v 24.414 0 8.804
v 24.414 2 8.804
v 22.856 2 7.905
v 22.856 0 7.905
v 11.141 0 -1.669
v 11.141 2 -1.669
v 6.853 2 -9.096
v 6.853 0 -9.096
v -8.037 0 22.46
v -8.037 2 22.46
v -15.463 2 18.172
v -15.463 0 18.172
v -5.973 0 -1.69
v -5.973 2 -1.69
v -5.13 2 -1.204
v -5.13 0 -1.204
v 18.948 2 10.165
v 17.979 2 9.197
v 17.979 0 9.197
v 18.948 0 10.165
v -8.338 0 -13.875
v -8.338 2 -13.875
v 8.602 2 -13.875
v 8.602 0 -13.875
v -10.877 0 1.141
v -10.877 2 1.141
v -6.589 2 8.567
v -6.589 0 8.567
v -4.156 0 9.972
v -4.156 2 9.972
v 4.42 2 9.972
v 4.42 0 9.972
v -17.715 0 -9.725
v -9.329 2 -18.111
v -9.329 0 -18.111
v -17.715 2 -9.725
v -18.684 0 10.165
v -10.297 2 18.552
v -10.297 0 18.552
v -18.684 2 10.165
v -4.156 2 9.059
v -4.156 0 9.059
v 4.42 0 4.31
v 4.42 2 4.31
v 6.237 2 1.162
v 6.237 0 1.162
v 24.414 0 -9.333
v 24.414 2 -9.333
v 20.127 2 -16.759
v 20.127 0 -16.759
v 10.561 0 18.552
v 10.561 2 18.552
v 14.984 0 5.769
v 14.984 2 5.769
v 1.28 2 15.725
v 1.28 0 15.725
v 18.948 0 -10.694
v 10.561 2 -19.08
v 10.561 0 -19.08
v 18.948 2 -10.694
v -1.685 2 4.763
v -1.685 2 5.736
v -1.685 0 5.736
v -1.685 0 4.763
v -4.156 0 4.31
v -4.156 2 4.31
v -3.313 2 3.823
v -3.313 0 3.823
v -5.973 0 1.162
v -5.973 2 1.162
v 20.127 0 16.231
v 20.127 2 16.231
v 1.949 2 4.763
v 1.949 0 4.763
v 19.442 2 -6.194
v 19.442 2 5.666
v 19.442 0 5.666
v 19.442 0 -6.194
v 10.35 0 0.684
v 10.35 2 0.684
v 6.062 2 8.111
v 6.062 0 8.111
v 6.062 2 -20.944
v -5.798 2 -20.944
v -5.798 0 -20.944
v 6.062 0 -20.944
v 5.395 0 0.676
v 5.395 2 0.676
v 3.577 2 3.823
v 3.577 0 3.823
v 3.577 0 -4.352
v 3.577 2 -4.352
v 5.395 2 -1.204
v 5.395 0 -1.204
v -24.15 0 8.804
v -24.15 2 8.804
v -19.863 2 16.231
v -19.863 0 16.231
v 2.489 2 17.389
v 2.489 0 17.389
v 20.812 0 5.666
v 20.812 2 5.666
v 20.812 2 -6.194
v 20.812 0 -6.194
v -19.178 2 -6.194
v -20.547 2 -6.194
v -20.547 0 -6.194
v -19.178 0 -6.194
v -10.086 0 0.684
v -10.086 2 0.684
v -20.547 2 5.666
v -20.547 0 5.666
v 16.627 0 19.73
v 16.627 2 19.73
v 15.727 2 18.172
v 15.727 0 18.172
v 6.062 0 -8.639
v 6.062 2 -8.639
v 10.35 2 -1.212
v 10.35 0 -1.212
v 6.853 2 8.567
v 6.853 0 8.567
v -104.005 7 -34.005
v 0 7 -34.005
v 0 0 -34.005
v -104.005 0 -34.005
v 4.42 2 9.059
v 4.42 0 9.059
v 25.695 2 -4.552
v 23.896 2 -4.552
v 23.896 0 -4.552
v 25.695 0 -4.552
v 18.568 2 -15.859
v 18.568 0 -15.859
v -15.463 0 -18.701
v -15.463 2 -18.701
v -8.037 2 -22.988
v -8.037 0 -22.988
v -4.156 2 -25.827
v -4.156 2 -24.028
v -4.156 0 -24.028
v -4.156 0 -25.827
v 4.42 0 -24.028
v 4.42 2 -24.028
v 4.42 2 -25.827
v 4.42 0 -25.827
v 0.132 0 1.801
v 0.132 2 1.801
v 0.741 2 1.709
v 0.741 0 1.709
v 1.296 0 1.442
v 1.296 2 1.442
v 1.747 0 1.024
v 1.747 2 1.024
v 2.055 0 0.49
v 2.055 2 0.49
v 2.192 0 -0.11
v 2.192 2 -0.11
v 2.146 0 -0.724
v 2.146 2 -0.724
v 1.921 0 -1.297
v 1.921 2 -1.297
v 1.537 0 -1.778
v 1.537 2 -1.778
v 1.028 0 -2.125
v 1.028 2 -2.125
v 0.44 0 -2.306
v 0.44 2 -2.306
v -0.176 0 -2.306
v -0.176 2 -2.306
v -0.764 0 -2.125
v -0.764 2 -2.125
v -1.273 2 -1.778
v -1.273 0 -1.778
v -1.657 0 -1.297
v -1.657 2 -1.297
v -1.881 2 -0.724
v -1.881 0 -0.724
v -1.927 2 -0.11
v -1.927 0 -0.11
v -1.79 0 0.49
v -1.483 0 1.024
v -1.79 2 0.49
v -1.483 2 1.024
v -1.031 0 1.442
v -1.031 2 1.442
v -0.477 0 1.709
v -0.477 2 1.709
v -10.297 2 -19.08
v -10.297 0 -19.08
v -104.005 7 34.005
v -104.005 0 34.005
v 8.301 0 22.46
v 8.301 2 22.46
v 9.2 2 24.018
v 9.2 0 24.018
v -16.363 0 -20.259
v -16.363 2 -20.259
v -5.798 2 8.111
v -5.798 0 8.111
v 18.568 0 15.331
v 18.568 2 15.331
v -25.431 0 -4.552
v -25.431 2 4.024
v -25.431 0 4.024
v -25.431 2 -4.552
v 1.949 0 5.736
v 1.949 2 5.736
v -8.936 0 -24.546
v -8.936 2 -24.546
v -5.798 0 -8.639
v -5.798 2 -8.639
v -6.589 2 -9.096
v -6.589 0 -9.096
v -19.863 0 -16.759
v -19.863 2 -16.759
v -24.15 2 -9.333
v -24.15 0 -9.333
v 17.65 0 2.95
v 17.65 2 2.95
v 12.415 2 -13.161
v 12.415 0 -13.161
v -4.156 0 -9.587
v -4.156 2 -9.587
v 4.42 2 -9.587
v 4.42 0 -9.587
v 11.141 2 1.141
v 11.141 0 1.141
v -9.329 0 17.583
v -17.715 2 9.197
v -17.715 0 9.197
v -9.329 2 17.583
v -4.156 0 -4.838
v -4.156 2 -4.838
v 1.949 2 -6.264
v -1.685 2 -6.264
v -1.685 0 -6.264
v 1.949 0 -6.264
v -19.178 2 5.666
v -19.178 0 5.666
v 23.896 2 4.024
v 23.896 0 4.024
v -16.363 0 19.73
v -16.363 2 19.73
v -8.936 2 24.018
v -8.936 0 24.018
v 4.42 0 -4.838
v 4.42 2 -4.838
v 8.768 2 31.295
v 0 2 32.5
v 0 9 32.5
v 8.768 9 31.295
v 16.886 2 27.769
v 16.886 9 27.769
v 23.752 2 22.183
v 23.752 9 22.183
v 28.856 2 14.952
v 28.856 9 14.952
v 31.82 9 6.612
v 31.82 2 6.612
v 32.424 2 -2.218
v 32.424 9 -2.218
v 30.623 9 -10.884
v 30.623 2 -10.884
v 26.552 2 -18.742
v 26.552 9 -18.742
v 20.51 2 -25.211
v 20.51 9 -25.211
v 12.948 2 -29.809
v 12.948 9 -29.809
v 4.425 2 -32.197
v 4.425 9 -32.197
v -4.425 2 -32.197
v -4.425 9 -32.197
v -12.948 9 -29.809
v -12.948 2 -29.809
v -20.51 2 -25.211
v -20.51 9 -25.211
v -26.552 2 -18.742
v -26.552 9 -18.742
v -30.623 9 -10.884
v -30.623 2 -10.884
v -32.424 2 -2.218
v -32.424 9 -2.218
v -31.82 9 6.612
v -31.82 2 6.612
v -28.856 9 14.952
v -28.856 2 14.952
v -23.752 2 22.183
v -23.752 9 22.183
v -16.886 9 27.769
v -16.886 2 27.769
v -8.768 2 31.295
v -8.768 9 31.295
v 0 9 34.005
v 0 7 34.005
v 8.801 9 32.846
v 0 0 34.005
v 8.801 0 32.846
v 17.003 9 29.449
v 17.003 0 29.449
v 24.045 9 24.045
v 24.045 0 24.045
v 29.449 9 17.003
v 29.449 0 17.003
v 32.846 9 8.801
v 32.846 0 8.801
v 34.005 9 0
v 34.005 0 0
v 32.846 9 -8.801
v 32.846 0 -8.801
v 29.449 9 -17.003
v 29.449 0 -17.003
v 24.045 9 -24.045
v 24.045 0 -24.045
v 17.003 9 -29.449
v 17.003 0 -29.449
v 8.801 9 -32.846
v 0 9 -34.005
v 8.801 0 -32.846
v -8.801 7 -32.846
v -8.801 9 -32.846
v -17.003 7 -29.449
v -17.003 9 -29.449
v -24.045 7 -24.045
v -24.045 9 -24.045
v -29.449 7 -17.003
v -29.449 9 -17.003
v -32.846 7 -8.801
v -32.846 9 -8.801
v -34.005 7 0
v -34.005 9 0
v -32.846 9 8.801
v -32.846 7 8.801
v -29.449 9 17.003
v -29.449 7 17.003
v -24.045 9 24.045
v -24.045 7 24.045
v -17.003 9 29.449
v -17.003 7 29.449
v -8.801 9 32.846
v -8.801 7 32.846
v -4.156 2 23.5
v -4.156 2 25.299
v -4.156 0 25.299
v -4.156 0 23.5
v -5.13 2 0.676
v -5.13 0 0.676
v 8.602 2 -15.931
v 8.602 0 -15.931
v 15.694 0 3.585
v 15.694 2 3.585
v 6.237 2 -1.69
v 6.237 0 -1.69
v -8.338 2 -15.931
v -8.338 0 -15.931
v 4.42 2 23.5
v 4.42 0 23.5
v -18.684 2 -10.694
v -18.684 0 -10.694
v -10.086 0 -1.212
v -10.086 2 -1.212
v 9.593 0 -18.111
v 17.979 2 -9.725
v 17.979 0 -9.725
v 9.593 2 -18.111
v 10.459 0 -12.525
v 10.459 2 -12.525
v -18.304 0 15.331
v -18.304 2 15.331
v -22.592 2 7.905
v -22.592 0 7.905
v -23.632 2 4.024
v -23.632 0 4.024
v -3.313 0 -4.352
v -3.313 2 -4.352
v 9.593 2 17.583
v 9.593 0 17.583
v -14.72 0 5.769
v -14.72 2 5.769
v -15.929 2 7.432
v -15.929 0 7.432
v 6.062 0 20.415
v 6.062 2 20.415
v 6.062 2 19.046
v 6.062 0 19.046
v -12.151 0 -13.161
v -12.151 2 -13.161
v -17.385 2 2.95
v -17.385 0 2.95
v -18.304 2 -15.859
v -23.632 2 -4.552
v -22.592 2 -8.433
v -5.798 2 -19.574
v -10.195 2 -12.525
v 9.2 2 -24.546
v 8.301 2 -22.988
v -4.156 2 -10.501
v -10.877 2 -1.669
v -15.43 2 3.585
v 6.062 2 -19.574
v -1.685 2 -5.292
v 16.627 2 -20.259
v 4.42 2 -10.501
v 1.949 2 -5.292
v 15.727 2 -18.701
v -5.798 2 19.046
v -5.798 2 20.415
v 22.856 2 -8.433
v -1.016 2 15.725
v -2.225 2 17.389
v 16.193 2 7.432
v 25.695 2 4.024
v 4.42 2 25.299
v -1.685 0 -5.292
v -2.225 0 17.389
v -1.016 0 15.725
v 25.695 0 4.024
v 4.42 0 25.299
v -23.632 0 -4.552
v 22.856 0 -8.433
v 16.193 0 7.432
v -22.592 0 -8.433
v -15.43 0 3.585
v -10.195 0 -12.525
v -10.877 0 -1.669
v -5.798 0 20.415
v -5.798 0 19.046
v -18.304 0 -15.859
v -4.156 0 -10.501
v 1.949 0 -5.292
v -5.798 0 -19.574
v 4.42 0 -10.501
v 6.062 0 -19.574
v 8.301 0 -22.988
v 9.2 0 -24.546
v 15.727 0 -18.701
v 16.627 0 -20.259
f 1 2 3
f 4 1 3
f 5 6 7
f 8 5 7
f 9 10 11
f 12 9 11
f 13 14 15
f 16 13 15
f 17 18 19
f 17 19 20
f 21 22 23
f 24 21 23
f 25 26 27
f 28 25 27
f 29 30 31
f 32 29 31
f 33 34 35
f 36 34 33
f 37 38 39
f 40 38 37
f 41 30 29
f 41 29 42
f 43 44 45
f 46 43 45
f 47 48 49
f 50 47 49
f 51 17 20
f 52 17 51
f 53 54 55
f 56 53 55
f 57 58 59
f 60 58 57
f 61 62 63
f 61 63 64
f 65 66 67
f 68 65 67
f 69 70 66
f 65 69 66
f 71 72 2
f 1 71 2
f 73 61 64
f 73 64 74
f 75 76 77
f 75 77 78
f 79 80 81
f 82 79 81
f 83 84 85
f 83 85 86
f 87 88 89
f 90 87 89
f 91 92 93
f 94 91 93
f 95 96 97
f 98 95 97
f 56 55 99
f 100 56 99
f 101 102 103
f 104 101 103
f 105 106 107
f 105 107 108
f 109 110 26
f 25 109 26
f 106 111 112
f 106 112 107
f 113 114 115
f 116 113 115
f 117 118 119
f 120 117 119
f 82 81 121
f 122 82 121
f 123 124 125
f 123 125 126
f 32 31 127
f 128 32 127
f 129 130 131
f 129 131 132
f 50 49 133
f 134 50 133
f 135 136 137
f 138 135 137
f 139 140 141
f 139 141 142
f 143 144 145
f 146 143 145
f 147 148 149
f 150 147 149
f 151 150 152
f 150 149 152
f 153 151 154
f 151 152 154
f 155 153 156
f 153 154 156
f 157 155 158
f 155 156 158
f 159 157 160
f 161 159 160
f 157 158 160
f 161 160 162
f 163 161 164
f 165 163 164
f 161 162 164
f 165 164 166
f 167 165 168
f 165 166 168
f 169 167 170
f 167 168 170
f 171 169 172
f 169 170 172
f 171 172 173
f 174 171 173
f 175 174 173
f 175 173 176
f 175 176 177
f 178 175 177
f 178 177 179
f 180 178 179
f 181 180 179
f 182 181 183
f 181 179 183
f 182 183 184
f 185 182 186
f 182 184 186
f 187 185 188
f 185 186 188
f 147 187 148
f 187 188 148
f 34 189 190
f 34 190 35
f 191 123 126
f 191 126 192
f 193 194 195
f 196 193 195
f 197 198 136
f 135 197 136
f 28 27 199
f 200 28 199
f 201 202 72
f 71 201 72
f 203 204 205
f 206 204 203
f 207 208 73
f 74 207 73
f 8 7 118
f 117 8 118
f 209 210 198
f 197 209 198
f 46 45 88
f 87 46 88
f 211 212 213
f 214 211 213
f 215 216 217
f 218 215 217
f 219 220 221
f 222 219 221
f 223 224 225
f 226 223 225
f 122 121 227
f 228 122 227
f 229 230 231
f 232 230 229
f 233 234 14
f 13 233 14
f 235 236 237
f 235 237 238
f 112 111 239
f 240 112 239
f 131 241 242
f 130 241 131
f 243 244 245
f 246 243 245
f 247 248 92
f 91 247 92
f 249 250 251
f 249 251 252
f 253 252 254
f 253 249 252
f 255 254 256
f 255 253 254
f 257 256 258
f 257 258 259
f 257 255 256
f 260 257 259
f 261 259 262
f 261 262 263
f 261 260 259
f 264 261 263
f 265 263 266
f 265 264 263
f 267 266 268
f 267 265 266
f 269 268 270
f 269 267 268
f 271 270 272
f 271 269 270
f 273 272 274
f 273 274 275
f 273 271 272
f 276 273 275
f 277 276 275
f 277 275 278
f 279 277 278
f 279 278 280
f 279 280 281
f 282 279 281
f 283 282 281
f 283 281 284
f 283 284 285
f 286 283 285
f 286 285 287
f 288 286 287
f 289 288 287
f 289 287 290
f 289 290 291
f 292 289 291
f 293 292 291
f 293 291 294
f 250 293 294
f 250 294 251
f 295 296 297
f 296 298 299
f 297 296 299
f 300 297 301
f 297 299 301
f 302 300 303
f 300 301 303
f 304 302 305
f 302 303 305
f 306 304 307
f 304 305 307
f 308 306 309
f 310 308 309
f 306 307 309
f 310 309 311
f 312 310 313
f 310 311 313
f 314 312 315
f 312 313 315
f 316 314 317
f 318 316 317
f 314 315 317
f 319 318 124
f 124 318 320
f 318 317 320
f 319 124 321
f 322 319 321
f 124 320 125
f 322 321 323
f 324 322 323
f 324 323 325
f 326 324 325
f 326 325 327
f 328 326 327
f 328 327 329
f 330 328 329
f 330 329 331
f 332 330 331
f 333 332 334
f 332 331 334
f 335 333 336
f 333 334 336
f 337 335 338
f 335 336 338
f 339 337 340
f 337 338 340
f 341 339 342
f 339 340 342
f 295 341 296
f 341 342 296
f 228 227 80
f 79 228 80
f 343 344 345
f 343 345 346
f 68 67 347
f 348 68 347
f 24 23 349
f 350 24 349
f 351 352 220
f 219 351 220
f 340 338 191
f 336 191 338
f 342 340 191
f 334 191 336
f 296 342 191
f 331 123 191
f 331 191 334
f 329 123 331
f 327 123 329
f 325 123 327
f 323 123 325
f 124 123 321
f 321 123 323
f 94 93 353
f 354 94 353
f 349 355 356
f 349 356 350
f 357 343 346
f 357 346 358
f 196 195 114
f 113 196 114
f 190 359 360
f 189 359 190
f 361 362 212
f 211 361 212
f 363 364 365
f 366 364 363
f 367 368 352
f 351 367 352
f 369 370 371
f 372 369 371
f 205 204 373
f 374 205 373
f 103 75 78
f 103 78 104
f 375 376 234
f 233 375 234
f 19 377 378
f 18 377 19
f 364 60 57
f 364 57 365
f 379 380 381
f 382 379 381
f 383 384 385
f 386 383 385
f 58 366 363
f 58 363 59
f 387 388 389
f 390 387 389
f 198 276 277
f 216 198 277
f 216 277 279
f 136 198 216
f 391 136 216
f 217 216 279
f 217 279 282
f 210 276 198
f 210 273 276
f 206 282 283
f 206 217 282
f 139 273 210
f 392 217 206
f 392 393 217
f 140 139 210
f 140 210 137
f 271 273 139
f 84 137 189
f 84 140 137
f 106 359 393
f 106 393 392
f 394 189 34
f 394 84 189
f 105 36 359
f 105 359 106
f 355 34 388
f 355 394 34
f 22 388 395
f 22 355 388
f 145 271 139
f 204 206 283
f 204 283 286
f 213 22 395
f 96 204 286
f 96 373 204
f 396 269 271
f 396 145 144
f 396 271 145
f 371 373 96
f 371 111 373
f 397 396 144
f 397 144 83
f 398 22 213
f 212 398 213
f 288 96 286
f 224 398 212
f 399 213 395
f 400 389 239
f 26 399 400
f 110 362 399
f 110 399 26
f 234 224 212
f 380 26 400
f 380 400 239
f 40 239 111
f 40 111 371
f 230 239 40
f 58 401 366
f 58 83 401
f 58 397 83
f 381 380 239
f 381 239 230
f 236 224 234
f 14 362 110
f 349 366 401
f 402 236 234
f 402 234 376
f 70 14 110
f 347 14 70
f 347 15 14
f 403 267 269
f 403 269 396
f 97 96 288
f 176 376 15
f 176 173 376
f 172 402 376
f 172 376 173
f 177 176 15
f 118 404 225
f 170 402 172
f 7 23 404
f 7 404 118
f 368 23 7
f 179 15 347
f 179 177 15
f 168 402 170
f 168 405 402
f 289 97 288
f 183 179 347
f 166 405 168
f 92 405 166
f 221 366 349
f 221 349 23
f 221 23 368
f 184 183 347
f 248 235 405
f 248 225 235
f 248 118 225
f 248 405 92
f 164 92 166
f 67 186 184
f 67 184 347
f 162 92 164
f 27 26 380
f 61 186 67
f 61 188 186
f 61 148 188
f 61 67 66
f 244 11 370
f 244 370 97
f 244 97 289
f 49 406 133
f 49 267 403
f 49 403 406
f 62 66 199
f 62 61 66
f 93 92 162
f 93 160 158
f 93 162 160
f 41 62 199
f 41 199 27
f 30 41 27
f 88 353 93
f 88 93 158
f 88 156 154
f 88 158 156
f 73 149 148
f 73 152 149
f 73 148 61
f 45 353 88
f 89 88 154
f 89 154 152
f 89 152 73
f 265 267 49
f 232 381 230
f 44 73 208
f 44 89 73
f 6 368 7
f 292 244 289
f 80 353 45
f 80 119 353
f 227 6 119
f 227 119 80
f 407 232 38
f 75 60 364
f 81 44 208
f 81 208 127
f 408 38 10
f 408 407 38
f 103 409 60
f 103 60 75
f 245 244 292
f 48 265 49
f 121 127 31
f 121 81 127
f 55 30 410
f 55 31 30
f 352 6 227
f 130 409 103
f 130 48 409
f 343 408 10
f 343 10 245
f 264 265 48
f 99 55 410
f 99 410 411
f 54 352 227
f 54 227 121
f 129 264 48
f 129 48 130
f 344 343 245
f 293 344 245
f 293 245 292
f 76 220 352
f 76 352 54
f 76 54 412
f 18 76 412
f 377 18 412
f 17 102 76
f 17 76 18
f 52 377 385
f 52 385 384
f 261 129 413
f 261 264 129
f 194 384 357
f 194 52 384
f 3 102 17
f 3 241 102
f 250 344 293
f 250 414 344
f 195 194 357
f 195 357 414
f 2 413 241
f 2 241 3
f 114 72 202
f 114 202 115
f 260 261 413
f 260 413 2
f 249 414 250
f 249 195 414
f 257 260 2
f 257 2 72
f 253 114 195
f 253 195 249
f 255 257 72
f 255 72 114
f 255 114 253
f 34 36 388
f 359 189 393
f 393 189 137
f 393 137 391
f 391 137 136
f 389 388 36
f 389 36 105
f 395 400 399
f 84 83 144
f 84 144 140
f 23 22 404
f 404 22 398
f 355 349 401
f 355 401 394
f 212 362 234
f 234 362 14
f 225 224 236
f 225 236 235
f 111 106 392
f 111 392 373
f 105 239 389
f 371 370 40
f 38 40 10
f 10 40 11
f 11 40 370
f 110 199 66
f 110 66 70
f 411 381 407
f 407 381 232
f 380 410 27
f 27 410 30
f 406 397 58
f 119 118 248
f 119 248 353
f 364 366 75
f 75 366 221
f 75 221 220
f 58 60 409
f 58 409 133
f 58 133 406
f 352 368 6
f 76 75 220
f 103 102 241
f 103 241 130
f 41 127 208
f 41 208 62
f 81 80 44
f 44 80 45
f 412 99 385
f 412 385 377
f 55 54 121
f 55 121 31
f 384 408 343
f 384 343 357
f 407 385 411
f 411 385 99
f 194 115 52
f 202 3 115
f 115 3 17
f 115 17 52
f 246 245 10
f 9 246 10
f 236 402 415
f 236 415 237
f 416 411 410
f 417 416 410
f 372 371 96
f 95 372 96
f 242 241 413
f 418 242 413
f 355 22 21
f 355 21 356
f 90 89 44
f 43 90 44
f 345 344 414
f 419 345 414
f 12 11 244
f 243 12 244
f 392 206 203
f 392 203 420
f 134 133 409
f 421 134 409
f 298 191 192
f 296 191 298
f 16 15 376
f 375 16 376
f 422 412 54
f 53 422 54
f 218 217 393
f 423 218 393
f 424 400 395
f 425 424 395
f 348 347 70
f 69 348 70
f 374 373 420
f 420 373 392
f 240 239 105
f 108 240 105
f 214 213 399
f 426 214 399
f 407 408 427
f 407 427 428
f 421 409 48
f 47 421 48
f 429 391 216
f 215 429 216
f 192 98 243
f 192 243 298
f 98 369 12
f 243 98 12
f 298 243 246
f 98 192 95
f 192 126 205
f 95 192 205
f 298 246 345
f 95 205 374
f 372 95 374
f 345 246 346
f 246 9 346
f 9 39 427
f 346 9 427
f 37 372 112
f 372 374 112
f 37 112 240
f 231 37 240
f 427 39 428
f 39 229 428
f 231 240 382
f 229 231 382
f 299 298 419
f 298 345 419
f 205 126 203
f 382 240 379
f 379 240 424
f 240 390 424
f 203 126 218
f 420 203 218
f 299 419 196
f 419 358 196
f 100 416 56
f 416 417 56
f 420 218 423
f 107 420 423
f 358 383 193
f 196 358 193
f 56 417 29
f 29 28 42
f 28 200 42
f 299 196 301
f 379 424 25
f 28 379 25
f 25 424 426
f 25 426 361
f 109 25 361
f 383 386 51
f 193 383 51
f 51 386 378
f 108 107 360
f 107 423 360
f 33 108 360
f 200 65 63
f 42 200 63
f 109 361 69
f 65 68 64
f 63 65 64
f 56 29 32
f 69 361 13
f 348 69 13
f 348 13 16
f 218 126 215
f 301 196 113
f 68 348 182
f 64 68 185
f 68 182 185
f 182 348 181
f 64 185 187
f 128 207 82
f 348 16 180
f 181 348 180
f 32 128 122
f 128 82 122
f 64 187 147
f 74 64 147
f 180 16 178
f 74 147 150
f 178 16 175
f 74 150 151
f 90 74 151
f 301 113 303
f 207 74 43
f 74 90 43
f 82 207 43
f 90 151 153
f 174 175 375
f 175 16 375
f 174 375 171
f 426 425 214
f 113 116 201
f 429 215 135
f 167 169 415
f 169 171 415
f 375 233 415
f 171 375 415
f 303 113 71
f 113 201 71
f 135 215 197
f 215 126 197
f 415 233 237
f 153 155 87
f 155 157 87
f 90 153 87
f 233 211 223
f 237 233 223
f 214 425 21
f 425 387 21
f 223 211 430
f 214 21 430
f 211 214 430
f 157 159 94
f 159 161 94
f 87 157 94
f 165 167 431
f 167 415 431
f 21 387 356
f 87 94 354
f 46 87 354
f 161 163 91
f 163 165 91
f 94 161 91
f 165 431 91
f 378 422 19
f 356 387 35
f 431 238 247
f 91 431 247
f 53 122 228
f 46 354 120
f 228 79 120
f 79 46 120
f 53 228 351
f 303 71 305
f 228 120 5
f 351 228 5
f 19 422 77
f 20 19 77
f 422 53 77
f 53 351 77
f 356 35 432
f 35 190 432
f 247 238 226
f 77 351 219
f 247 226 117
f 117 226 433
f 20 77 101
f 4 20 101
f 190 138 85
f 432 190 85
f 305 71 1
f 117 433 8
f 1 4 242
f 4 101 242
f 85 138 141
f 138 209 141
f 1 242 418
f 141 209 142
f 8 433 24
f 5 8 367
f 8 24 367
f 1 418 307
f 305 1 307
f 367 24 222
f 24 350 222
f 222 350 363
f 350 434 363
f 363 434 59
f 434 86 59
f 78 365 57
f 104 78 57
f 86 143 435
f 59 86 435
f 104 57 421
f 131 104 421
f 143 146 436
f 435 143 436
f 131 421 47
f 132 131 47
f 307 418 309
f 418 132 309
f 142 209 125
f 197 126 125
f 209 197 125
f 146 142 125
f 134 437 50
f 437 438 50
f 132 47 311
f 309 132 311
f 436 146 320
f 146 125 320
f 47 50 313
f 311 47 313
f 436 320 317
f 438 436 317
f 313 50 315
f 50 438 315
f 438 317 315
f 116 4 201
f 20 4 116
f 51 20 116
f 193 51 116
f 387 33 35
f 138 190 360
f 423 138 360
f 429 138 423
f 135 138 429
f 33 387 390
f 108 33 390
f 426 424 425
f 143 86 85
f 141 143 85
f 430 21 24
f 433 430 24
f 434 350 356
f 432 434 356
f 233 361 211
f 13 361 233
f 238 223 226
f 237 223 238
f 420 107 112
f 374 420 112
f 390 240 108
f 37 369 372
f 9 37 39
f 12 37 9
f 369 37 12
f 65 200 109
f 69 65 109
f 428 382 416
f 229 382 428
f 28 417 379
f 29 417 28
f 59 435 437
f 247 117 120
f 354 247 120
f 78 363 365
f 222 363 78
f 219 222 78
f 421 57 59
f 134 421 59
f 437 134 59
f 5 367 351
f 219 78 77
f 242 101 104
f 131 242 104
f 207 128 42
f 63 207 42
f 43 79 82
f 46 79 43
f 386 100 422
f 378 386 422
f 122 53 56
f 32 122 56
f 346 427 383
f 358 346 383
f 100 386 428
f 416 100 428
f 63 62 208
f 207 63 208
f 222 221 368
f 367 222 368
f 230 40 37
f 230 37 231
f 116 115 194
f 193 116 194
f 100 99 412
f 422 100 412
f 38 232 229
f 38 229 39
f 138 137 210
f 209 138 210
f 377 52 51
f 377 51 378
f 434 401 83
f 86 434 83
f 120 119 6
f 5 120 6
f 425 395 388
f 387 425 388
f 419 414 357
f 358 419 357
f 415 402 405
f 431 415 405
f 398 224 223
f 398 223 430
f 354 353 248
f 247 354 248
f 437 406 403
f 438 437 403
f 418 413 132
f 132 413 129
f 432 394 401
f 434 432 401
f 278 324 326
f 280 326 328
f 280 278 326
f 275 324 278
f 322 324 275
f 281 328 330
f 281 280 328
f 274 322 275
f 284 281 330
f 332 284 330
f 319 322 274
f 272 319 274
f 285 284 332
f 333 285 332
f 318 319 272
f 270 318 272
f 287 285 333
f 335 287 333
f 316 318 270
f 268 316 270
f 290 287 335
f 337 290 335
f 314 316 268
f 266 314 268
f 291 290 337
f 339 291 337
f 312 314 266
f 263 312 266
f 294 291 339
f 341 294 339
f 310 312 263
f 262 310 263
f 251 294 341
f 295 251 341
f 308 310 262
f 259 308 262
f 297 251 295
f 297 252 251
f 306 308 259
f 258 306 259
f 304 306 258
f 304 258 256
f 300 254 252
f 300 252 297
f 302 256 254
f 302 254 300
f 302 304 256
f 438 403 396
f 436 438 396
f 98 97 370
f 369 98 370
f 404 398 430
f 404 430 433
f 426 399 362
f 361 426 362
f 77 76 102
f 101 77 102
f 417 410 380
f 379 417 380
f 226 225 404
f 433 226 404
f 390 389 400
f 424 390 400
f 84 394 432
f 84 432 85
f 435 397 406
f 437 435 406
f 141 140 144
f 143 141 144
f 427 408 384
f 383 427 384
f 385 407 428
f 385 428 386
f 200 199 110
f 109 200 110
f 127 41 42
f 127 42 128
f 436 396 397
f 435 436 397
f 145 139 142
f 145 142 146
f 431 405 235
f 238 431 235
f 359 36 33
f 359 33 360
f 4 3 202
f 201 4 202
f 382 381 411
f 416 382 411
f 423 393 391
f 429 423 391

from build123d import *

# Parameters (mm, degrees)
SKETCH_2_R           = 32.5
EXTRUDE_2_DEPTH      = 2
SKETCH_3_R           = 2.065299263
SKETCH_3_W           = 3.634517066
SKETCH_3_H           = 0.972738316
SKETCH_3_H_2         = 0.972738315
SKETCH_3_W_2         = 8.575403128
SKETCH_3_H_3         = 0.913568408
SKETCH_3_H_4         = 0.913568407
SKETCH_3_W_3         = 16.93922902
SKETCH_3_H_5         = 2.056372223
SKETCH_3_H_6         = 1.799325695
SKETCH_3_W_4         = 1.799325695
SKETCH_3_H_7         = 8.575403129
SKETCH_3_W_5         = 11.860354008
SKETCH_3_H_8         = 1.369825
SKETCH_3_W_6         = 1.369825
SKETCH_3_H_9         = 11.860354008
CUT_EXTRUDE_1_DEPTH  = 2
EXTRUDE_3_DEPTH      = 7
EXTRUDE_3_DEPTH_BACK = 2
SKETCH_4_R           = 34.00500901
SKETCH_4_R_2         = 32.5
EXTRUDE_START        = 7
EXTRUDE_4_DEPTH      = 7


with BuildPart() as part:
    # 草图2 → 凸台-拉伸2 (new body)
    with BuildSketch(Plane(origin=(0, 0, 0), x_dir=(1, 0, 0), z_dir=(0, 1, 0))):
        with Locations(Location((0, 0, 0), (0, 0, 270))):
            Circle(SKETCH_2_R)
    extrude(amount=EXTRUDE_2_DEPTH)

    # 草图3 → 切除-拉伸1 (cut)
    with BuildSketch(Plane(origin=(0, 2, 0), x_dir=(1, 0, 0), z_dir=(0, 1, 0))):
        with Locations(Location((0.132079869, 0.264159738, 0), (0, 0, 270))):
            Circle(SKETCH_3_R)
        Polygon((4.419781433, 4.838054797), (3.577365341, 4.351685639), (5.394623874, 1.20410153), (6.237039966, 1.690470687), align=None)
        with Locations((0.132079869, 5.777996588)):
            Rectangle(SKETCH_3_W, SKETCH_3_H)
        Polygon((6.237039966, -1.162151211), (5.394623874, -0.675782054), (3.577365341, -3.823366163), (4.419781433, -4.309735321), align=None)
        with Locations((0.132079869, -5.249677113)):
            Rectangle(SKETCH_3_W, SKETCH_3_H_2)
        Polygon((-4.155621695, -4.309735321), (-3.313205603, -3.823366163), (-5.130464136, -0.675782054), (-5.972880228, -1.162151211), align=None)
        Polygon((-5.972880228, 1.690470687), (-5.130464136, 1.20410153), (-3.313205603, 4.351685639), (-4.155621695, 4.838054797), align=None)
        with Locations((0.132079869, 10.044028173)):
            Rectangle(SKETCH_3_W_2, SKETCH_3_H_3)
        Polygon((6.853430322, 9.095744536), (6.062256873, 8.638960332), (10.349958437, 1.212443375), (11.141131886, 1.669227579), align=None)
        Polygon((11.141131886, -1.140908103), (10.349958437, -0.684123899), (6.062256873, -8.110640856), (6.853430322, -8.56742506), align=None)
        with Locations((0.132079869, -9.515708698)):
            Rectangle(SKETCH_3_W_2, SKETCH_3_H_4)
        Polygon((-6.589270584, -8.56742506), (-5.798097135, -8.110640856), (-10.085798699, -0.684123899), (-10.876972148, -1.140908103), align=None)
        Polygon((-10.876972148, 1.669227579), (-10.085798699, 1.212443375), (-5.798097135, 8.638960332), (-6.589270584, 9.095744536), align=None)
        with Locations((0.132079869, 14.903001057)):
            Rectangle(SKETCH_3_W_3, SKETCH_3_H_5)
        Polygon((12.415053578, 13.160619536), (10.459327375, 12.525165572), (15.693837014, -3.584998569), (17.649563217, -2.949544605), align=None)
        Polygon((16.192989615, -7.432417203), (14.984284348, -5.768777127), (1.280160199, -15.725406131), (2.488865465, -17.389046206), align=None)
        Polygon((-2.224705727, -17.389046206), (-1.016000461, -15.725406131), (-14.72012461, -5.768777127), (-15.928829877, -7.432417203), align=None)
        Polygon((-17.385403479, -2.949544605), (-15.429677276, -3.584998569), (-10.195167637, 12.525165572), (-12.15089384, 13.160619536), align=None)
        with Locations((0.132079869, 24.927815646)):
            Rectangle(SKETCH_3_W_2, SKETCH_3_H_6)
        Polygon((9.200480768, 24.546493967), (8.30081792, 22.988232205), (15.727334878, 18.700530641), (16.626997725, 20.258792403), align=None)
        Polygon((20.126712534, 16.759077594), (18.568450772, 15.859414746), (22.856152336, 8.432897789), (24.414414098, 9.332560637), align=None)
        with Locations((24.795735777, 0.264159738)):
            Rectangle(SKETCH_3_W_4, SKETCH_3_H_7)
        Polygon((24.414414098, -8.804241161), (22.856152336, -7.904578313), (18.568450772, -15.331095271), (20.126712534, -16.230758118), align=None)
        Polygon((16.626997725, -19.730472927), (15.727334878, -18.172211165), (8.30081792, -22.459912729), (9.200480768, -24.018174491), align=None)
        with Locations((0.132079869, -24.39949617)):
            Rectangle(SKETCH_3_W_2, SKETCH_3_H_6)
        Polygon((-8.93632103, -24.018174491), (-8.036658182, -22.459912729), (-15.46317514, -18.172211165), (-16.362837987, -19.730472927), align=None)
        Polygon((-19.862552796, -16.230758118), (-18.304291034, -15.331095271), (-22.591992598, -7.904578313), (-24.15025436, -8.804241161), align=None)
        with Locations((-24.531576039, 0.264159738)):
            Rectangle(SKETCH_3_W_4, SKETCH_3_H_7)
        Polygon((-24.15025436, 9.332560637), (-22.591992598, 8.432897789), (-18.304291034, 15.859414746), (-19.862552796, 16.759077594), align=None)
        Polygon((-16.362837987, 20.258792403), (-15.46317514, 18.700530641), (-8.036658182, 22.988232205), (-8.93632103, 24.546493967), align=None)
        Polygon((9.592845567, 18.111462182), (10.561458114, 19.080074729), (18.94799486, 10.693537983), (17.979382313, 9.724925436), align=None)
        with Locations((0.132079869, 20.258792403)):
            Rectangle(SKETCH_3_W_5, SKETCH_3_H_8)
        with Locations((20.126712534, 0.264159738)):
            Rectangle(SKETCH_3_W_6, SKETCH_3_H_9)
        Polygon((17.979382313, -9.19660596), (18.94799486, -10.165218507), (10.561458114, -18.551755253), (9.592845567, -17.583142706), align=None)
        with Locations((0.132079869, -19.730472927)):
            Rectangle(SKETCH_3_W_5, SKETCH_3_H_8)
        Polygon((-9.328685829, -17.583142706), (-10.297298376, -18.551755253), (-18.683835122, -10.165218507), (-17.715222575, -9.19660596), align=None)
        with Locations((-19.862552796, 0.264159738)):
            Rectangle(SKETCH_3_W_6, SKETCH_3_H_9)
        Polygon((-17.715222575, 9.724925436), (-18.683835122, 10.693537983), (-10.297298376, 19.080074729), (-9.328685829, 18.111462182), align=None)
    extrude(amount=-CUT_EXTRUDE_1_DEPTH, mode=Mode.SUBTRACT)

    # 草图4 → 凸台-拉伸3 (add, two sides: drawn at the far end of the back side and taken through both)
    with BuildSketch(Plane(origin=(0, 2, 0), x_dir=(1, 0, 0), z_dir=(0, 1, 0)).offset(-EXTRUDE_3_DEPTH_BACK)):
        with Locations(Location((0, 0, 0), (0, 0, 270))):
            Circle(SKETCH_4_R)
        with Locations(Location((0, 0, 0), (0, 0, 270))):
            Circle(SKETCH_4_R_2, mode=Mode.SUBTRACT)
    extrude(amount=EXTRUDE_3_DEPTH + EXTRUDE_3_DEPTH_BACK)

    # 草图5 → 凸台-拉伸4 (add)
    with BuildSketch(Plane(origin=(0, 0, 0), x_dir=(1, 0, 0), z_dir=(0, 1, 0)).offset(EXTRUDE_START)):
        with BuildLine():
            Line((-34.00500901, 34.00500901), (-104.00500901, 34.00500901))
            Line((-104.00500901, 34.00500901), (-104.00500901, -34.00500901))
            Line((-104.00500901, -34.00500901), (0, -34.00500901))
            ThreePointArc((0, -34.00500901), (-34.00500901, 0), (0, 34.00500901))
            Line((0, 34.00500901), (-34.00500901, 34.00500901))
        make_face()
    extrude(amount=-EXTRUDE_4_DEPTH)


solid = part.part
